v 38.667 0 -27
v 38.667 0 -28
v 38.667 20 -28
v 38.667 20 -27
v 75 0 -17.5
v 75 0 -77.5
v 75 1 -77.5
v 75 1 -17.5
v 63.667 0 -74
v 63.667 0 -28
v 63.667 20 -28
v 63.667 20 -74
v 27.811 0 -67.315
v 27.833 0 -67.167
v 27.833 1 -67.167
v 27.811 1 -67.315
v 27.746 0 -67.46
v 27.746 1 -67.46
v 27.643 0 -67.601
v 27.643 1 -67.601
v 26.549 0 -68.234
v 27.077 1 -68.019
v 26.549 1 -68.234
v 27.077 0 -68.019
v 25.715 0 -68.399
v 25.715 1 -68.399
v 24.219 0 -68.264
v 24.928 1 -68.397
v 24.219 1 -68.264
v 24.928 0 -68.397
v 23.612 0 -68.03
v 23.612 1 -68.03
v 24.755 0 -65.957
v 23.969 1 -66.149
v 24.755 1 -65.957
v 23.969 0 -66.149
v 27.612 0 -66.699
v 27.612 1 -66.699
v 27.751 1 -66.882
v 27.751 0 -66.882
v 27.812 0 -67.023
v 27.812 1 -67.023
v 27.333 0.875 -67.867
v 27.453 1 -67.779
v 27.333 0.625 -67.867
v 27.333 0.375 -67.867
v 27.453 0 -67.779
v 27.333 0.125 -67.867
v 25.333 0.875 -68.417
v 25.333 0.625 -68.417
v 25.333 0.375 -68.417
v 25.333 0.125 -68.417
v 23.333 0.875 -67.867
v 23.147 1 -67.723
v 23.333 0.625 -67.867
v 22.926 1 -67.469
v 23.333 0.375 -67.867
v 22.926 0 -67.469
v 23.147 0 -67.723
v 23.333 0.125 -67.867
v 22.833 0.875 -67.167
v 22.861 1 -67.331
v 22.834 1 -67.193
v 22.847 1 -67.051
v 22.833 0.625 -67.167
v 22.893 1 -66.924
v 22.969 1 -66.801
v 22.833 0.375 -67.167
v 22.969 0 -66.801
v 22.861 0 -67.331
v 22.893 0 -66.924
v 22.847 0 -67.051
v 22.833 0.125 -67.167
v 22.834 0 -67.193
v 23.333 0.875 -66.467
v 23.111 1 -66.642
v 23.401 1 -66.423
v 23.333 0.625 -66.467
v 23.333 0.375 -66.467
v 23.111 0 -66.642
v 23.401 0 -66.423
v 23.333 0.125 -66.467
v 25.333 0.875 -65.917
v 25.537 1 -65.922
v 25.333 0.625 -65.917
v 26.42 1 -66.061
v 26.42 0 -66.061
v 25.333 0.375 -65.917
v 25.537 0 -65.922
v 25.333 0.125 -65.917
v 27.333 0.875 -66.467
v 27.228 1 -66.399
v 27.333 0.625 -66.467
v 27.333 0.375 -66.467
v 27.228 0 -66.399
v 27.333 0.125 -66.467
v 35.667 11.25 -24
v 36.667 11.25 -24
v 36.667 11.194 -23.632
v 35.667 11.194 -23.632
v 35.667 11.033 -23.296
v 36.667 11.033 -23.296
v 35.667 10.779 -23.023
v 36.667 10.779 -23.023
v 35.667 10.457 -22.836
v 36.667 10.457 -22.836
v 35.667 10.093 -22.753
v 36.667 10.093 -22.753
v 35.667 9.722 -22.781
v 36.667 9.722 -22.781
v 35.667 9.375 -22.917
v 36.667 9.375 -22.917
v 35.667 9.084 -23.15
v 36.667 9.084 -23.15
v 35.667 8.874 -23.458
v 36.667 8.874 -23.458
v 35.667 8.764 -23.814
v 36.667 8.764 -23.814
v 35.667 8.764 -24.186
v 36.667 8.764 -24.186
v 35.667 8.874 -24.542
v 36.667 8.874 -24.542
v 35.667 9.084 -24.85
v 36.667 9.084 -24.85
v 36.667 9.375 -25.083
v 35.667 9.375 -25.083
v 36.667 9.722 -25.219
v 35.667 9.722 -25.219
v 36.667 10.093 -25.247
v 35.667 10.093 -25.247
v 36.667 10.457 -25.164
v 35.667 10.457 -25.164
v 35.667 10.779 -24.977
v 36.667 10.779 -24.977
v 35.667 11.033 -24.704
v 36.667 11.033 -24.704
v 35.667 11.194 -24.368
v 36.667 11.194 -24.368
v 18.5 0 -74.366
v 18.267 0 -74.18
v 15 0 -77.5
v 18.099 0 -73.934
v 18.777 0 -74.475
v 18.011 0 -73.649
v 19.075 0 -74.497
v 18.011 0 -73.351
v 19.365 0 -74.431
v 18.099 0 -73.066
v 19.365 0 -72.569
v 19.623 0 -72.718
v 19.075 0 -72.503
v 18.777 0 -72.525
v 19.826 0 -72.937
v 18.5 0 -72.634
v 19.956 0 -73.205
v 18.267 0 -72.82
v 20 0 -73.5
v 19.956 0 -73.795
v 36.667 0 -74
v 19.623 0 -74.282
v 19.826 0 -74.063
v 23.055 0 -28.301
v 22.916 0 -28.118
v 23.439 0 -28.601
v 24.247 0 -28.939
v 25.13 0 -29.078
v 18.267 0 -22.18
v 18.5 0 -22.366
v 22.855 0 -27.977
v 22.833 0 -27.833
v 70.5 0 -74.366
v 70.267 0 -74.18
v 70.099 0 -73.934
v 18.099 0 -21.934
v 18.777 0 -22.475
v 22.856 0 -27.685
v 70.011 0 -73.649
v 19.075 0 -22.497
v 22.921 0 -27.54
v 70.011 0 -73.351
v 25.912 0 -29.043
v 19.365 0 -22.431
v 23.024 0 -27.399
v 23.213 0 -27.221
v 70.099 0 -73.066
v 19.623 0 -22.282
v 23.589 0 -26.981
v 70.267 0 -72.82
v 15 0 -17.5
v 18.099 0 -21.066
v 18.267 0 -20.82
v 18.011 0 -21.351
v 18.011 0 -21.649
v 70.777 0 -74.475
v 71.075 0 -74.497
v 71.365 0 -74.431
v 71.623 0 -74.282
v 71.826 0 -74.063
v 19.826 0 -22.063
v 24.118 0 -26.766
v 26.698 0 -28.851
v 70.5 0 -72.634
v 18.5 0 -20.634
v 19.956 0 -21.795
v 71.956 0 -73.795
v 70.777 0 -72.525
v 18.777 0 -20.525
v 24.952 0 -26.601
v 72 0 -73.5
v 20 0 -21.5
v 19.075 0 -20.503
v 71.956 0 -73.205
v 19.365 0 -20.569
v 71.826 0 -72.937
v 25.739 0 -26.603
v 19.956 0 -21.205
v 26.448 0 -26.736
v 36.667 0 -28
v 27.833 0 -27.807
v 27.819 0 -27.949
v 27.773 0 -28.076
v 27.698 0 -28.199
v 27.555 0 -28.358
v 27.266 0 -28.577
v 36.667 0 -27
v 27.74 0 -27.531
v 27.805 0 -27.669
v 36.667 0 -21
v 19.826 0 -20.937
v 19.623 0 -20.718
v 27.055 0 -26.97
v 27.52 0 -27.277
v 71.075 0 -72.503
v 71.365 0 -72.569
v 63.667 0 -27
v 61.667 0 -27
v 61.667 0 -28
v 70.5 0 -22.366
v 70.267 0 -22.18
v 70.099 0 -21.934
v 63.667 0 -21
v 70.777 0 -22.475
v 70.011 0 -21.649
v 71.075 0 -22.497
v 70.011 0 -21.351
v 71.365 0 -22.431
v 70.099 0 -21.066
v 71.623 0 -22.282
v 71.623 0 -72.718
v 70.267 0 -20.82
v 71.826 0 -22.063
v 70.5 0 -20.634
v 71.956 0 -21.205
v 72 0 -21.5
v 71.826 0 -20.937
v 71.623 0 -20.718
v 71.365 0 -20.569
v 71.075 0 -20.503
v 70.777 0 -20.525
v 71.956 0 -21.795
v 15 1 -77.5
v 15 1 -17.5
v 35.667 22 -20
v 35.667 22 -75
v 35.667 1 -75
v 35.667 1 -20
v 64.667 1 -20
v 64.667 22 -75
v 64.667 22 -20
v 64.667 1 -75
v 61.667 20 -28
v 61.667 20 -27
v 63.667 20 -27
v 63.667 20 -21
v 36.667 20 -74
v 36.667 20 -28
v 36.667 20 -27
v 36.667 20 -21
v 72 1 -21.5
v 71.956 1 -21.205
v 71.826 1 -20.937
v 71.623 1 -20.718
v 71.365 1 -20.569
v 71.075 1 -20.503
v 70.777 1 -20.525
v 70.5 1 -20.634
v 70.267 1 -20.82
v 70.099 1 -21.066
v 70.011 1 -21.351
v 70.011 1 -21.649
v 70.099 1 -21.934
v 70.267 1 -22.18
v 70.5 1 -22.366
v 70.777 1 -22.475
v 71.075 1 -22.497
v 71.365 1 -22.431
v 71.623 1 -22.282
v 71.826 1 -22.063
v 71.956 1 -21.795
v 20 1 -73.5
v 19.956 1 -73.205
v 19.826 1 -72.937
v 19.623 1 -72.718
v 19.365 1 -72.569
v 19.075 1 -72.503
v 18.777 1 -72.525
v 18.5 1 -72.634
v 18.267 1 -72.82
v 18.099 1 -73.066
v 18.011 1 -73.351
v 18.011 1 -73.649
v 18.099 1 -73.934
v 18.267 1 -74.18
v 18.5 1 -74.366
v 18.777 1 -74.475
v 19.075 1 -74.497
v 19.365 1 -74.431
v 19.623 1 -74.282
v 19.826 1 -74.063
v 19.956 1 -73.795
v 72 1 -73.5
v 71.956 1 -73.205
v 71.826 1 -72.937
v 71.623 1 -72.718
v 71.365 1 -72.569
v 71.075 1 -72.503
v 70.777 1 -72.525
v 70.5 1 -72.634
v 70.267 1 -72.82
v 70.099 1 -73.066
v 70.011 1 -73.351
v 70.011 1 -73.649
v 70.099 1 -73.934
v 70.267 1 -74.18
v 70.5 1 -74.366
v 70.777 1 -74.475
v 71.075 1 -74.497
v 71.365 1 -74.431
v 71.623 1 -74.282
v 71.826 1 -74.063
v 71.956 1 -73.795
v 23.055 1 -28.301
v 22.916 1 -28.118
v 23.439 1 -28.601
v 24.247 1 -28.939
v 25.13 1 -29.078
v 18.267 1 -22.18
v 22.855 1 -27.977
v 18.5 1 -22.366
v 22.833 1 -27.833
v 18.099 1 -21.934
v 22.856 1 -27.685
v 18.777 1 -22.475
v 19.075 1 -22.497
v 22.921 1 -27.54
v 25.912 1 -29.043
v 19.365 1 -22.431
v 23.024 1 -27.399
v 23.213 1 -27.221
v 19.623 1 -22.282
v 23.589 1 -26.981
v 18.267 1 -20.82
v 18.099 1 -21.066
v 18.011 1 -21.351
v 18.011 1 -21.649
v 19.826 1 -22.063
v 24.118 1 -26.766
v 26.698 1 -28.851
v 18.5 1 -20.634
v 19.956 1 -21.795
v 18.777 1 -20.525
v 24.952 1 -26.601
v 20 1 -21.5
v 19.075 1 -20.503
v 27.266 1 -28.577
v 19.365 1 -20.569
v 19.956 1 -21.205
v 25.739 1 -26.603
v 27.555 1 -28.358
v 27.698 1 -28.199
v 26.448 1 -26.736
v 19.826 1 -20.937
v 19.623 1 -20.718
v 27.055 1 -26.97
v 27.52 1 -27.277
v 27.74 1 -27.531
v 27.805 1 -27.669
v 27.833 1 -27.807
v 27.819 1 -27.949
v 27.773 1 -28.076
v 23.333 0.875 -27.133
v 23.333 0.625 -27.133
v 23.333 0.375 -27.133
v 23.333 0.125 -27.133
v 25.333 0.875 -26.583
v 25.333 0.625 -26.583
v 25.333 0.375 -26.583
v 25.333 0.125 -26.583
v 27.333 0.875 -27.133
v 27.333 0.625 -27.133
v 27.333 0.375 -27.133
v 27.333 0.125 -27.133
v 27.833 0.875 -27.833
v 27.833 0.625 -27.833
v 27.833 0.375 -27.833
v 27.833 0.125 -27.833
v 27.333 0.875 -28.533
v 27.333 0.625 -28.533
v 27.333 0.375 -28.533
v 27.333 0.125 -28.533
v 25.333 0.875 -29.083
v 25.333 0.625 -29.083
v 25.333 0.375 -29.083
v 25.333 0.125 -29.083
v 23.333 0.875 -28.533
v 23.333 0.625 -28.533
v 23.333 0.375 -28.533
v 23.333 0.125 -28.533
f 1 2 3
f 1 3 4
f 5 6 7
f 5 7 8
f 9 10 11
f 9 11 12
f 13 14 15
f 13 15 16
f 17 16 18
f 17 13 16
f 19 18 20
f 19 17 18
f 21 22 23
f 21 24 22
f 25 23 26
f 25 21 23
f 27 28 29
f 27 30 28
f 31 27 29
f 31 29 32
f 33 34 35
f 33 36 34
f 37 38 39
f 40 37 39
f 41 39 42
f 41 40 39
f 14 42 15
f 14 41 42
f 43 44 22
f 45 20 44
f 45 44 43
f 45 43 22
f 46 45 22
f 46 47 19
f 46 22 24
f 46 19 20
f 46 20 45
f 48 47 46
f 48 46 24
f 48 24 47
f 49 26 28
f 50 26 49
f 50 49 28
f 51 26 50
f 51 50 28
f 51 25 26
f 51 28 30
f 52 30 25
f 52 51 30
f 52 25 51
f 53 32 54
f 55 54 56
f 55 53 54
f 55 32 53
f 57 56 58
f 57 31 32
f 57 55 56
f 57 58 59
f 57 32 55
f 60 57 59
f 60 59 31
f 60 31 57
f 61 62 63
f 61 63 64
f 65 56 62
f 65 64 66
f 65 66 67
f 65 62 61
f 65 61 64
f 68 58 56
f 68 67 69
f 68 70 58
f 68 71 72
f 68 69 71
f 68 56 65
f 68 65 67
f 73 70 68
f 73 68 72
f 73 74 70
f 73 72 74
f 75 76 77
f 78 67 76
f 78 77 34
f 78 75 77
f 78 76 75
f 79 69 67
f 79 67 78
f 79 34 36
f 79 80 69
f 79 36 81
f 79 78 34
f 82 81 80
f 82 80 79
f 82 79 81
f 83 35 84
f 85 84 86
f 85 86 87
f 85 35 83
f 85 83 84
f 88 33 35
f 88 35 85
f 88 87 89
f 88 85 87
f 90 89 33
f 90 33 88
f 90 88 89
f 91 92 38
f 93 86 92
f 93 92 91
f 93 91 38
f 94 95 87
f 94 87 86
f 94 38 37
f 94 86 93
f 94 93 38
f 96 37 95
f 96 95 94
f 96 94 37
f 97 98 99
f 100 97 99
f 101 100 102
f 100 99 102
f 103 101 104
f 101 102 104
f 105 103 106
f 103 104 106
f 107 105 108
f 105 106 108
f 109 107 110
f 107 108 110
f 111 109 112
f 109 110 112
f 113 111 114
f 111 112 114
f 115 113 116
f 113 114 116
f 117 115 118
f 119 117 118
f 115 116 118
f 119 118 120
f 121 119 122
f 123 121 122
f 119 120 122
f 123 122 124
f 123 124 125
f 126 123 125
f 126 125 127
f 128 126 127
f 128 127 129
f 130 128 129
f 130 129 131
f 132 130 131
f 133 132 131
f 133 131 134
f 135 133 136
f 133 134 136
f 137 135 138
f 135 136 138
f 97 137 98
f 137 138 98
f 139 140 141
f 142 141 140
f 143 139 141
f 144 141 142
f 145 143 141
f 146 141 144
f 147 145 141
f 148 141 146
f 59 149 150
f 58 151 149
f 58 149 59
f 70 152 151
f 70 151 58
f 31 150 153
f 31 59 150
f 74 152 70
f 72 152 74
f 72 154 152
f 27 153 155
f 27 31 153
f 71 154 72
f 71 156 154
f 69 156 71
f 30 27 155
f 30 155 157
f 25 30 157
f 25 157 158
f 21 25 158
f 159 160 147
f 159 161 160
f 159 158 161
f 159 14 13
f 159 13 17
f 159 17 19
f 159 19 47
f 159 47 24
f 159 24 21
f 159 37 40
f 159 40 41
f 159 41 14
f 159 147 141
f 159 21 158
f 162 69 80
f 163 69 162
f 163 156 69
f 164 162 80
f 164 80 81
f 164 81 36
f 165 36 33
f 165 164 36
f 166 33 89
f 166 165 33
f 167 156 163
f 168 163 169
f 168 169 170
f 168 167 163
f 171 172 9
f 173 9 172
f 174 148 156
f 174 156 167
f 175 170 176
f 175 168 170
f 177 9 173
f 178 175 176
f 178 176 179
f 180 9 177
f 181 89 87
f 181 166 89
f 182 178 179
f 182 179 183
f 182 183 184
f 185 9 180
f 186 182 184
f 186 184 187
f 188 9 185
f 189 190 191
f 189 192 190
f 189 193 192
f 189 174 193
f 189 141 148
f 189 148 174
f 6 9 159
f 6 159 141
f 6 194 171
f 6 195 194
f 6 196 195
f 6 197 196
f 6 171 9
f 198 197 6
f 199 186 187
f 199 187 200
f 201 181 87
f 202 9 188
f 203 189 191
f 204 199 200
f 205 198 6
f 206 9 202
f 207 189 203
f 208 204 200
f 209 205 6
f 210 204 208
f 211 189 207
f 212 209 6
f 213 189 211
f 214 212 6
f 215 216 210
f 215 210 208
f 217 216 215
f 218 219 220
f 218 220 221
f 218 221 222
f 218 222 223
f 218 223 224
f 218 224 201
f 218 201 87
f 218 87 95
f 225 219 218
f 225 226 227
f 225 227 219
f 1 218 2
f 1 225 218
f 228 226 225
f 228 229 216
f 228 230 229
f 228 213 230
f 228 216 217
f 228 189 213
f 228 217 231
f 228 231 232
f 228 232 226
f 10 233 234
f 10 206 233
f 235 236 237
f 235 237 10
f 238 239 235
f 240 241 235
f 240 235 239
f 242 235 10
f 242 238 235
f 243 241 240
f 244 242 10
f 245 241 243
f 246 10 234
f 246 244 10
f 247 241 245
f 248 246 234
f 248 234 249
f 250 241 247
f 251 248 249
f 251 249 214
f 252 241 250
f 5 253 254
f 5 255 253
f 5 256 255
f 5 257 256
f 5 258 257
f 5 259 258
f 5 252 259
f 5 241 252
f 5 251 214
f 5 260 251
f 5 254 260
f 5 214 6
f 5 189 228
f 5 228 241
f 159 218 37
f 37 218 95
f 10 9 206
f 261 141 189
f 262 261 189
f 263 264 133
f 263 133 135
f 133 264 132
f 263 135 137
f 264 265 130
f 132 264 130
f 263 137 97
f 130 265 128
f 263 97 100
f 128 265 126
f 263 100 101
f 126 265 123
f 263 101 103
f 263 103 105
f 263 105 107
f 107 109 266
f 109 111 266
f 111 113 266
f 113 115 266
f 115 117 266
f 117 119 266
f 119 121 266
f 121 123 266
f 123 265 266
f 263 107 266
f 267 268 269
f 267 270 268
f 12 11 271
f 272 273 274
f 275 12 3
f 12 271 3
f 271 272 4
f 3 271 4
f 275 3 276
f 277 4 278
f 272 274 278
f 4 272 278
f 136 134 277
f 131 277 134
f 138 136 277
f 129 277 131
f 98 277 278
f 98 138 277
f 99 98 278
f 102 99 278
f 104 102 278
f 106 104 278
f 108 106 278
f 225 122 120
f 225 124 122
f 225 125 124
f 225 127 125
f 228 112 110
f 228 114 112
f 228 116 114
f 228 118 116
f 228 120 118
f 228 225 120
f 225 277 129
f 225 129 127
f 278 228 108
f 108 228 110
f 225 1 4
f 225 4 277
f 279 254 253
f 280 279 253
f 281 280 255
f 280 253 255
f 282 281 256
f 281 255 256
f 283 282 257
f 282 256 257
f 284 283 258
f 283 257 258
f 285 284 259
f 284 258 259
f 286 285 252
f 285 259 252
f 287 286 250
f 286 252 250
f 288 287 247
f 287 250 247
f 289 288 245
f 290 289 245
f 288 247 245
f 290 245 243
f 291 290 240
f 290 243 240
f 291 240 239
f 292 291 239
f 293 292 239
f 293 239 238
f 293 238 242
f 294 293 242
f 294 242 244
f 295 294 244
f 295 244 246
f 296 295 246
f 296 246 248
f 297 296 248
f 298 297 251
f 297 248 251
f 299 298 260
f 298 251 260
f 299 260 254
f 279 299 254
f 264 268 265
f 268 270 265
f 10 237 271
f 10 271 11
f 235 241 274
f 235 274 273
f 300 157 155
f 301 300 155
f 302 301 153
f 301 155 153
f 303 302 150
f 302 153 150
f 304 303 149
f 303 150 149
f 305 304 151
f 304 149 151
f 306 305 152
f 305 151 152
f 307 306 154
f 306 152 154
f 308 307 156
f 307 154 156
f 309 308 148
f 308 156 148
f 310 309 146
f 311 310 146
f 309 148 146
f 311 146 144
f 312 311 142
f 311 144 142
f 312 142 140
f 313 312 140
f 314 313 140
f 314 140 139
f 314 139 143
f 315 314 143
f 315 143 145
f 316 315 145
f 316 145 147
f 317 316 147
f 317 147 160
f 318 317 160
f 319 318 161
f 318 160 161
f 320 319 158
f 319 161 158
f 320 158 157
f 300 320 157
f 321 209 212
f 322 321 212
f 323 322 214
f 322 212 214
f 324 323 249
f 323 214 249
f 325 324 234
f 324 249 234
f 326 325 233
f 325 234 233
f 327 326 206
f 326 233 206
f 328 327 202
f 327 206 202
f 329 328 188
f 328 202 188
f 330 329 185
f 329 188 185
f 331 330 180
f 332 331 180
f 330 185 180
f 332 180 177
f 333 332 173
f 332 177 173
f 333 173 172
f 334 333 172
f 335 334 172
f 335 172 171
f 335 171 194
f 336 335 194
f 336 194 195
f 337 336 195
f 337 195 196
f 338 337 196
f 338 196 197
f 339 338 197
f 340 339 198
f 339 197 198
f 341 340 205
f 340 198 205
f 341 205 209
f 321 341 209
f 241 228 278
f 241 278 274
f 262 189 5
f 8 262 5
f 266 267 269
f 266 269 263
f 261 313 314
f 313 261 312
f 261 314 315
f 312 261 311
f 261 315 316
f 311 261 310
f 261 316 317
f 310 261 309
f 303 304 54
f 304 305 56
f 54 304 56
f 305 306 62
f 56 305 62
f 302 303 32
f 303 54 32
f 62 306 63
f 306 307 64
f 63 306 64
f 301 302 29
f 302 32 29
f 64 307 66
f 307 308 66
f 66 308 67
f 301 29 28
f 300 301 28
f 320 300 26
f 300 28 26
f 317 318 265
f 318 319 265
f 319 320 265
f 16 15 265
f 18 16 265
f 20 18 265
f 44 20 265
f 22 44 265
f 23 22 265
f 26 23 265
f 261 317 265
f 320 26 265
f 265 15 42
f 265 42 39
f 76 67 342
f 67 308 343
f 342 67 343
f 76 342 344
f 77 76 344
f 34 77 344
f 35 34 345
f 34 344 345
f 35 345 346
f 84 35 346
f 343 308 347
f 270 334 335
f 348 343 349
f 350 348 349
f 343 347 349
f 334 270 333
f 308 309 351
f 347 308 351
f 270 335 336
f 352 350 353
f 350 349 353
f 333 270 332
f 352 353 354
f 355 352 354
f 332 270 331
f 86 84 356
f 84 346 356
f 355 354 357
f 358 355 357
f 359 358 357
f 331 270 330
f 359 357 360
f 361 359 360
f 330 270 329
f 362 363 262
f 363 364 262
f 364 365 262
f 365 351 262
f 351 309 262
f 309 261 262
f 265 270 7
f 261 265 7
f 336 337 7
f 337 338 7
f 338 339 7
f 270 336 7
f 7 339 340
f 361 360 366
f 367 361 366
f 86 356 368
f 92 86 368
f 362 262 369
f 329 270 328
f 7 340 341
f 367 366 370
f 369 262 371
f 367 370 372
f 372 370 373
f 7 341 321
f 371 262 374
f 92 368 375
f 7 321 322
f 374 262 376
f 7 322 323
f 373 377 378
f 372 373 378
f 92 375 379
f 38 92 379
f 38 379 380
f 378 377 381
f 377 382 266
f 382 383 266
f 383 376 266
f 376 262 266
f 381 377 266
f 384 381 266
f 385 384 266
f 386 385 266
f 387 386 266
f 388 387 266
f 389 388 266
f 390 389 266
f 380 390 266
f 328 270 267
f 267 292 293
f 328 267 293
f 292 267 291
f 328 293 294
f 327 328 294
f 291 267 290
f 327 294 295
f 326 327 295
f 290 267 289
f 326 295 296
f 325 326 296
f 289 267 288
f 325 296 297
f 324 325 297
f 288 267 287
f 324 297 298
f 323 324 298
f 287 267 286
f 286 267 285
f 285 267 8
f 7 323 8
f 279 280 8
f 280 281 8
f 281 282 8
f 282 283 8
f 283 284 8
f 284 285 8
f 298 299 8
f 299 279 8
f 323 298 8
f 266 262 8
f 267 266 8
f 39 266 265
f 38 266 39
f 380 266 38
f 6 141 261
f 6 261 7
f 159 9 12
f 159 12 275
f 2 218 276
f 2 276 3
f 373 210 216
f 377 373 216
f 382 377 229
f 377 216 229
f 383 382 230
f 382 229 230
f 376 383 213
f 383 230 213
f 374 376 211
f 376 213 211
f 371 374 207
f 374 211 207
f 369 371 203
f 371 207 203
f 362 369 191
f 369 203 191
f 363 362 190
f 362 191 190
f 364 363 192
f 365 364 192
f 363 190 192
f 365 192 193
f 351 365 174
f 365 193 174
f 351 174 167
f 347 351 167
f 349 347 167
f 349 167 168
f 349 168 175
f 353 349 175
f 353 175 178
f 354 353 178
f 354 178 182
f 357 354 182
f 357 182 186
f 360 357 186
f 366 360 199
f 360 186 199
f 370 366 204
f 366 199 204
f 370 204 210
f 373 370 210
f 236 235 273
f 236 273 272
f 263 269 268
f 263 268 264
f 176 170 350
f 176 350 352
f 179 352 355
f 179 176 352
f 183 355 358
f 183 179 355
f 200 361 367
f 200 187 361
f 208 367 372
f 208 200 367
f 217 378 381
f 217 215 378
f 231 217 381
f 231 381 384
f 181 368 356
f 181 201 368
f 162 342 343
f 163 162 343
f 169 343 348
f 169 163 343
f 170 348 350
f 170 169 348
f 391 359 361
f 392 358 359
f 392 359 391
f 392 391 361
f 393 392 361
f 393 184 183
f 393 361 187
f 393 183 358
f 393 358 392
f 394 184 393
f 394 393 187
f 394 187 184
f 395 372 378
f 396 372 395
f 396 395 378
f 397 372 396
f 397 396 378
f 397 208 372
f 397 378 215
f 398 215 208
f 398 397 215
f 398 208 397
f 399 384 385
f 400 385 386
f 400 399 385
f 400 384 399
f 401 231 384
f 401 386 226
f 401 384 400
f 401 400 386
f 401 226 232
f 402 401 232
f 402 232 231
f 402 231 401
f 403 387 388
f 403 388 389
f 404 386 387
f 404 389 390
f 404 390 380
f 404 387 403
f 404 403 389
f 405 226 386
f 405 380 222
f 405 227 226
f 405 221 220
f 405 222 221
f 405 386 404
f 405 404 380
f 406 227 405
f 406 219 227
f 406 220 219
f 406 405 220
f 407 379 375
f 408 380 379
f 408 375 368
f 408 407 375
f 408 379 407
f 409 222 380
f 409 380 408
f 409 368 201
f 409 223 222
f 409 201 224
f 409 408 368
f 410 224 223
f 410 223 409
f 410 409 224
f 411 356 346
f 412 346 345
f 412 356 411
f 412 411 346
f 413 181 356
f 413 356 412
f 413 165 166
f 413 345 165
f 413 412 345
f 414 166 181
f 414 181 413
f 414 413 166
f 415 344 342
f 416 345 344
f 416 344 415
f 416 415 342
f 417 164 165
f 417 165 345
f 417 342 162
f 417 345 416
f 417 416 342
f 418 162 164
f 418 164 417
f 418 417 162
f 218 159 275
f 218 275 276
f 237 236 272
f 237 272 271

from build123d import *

# Parameters (mm, degrees)
F0_W     = 60
F0_H     = 60
F0_R     = 1
F0_W_2   = 29
F0_H_2   = 55
F1_DEPTH = 1
F2_DEPTH = 20
F3_W     = 29
F3_H     = 55
F4_DEPTH = 2
F5_R     = 1.25
F6_DEPTH = 1


with BuildPart() as f1:
    # F0 (on Front) → F1 (new body)
    with BuildSketch(Plane.XZ):
        with Locations((45, -47.5)):
            Rectangle(F0_W, F0_H)
        with Locations((19, -73.5)):
            Circle(F0_R, mode=Mode.SUBTRACT)
        with BuildLine():
            add(Edge.make_bspline(
                [(28.3333333333, -67.1666666667), (28.3386910441, -67.1122126941), (28.3379488497, -66.9506494032), (28.2562853666, -66.6493198021), (28.002751809, -66.341706647), (27.672972526, -66.0654054786), (27.2898969931, -65.8388871979), (26.8077967498, -65.6378105429), (26.2767972884, -65.4717289024), (25.7573018765, -65.4109314105), (25.4558981893, -65.4106282423), (25.3333333333, -65.4166666667)],
                knots=[0, 0, 0, 0, 0.1634113073, 0.4836883399, 0.9124679887, 1.3341141703, 1.7731849289, 2.2406235312, 2.899707559, 3.4345550853, 3.8026975859, 3.8026975859, 3.8026975859, 3.8026975859], degree=3))
            add(Edge.make_bspline(
                [(28.3333333333, -67.1666666667), (28.3386910441, -67.2211206392), (28.3379488497, -67.3826839302), (28.2562853666, -67.6840135313), (28.002751809, -67.9916266863), (27.672972526, -68.2679278548), (27.2898969931, -68.4944461355), (26.8077967498, -68.6955227904), (26.2767972884, -68.861604431), (25.7573018765, -68.9224019229), (25.4558981893, -68.922705091), (25.3333333333, -68.9166666667)],
                knots=[0, 0, 0, 0, 0.1634113073, 0.4836883399, 0.9124679887, 1.3341141703, 1.7731849289, 2.2406235312, 2.899707559, 3.4345550853, 3.8026975859, 3.8026975859, 3.8026975859, 3.8026975859], degree=3))
            add(Edge.make_bspline(
                [(22.3333333333, -67.1666666667), (22.3279756226, -67.2211206392), (22.328717817, -67.3826839302), (22.4103813, -67.6840135313), (22.6639148576, -67.9916266863), (22.9936941407, -68.2679278548), (23.3767696736, -68.4944461355), (23.8588699169, -68.6955227904), (24.3898693782, -68.861604431), (24.9093647902, -68.9224019229), (25.2107684774, -68.922705091), (25.3333333333, -68.9166666667)],
                knots=[0, 0, 0, 0, 0.1634113073, 0.4836883399, 0.9124679887, 1.3341141703, 1.7731849289, 2.2406235312, 2.899707559, 3.4345550853, 3.8026975859, 3.8026975859, 3.8026975859, 3.8026975859], degree=3))
            add(Edge.make_bspline(
                [(22.3333333333, -67.1666666667), (22.3279756226, -67.1122126941), (22.328717817, -66.9506494032), (22.4103813, -66.6493198021), (22.6639148576, -66.341706647), (22.9936941407, -66.0654054786), (23.3767696736, -65.8388871979), (23.8588699169, -65.6378105429), (24.3898693782, -65.4717289024), (24.9093647902, -65.4109314105), (25.2107684774, -65.4106282423), (25.3333333333, -65.4166666667)],
                knots=[0, 0, 0, 0, 0.1634113073, 0.4836883399, 0.9124679887, 1.3341141703, 1.7731849289, 2.2406235312, 2.899707559, 3.4345550853, 3.8026975859, 3.8026975859, 3.8026975859, 3.8026975859], degree=3))
        make_face(mode=Mode.SUBTRACT)
        with Locations((71, -73.5)):
            Circle(F0_R, mode=Mode.SUBTRACT)
        with Locations((50.1666666667, -47.5)):
            Rectangle(F0_W_2, F0_H_2, mode=Mode.SUBTRACT)
        with BuildLine():
            add(Edge.make_bspline(
                [(28.3333333333, -27.8333333333), (28.3386910441, -27.7788793608), (28.3379488497, -27.6173160698), (28.2562853666, -27.3159864687), (28.002751809, -27.0083733137), (27.672972526, -26.7320721453), (27.2898969931, -26.5055538646), (26.8077967498, -26.3044772096), (26.2767972884, -26.138395569), (25.7573018765, -26.0775980772), (25.4558981893, -26.077294909), (25.3333333333, -26.0833333333)],
                knots=[0, 0, 0, 0, 0.1634113073, 0.4836883399, 0.9124679887, 1.3341141703, 1.7731849289, 2.2406235312, 2.899707559, 3.4345550853, 3.8026975859, 3.8026975859, 3.8026975859, 3.8026975859], degree=3))
            add(Edge.make_bspline(
                [(28.3333333333, -27.8333333333), (28.3386910441, -27.8877873059), (28.3379488497, -28.0493505969), (28.2562853666, -28.350680198), (28.002751809, -28.658293353), (27.672972526, -28.9345945214), (27.2898969931, -29.1611128021), (26.8077967498, -29.3621894571), (26.2767972884, -29.5282710976), (25.7573018765, -29.5890685895), (25.4558981893, -29.5893717577), (25.3333333333, -29.5833333333)],
                knots=[0, 0, 0, 0, 0.1634113073, 0.4836883399, 0.9124679887, 1.3341141703, 1.7731849289, 2.2406235312, 2.899707559, 3.4345550853, 3.8026975859, 3.8026975859, 3.8026975859, 3.8026975859], degree=3))
            add(Edge.make_bspline(
                [(22.3333333333, -27.8333333333), (22.3279756226, -27.8877873059), (22.328717817, -28.0493505969), (22.4103813, -28.350680198), (22.6639148576, -28.658293353), (22.9936941407, -28.9345945214), (23.3767696736, -29.1611128021), (23.8588699169, -29.3621894571), (24.3898693782, -29.5282710976), (24.9093647902, -29.5890685895), (25.2107684774, -29.5893717577), (25.3333333333, -29.5833333333)],
                knots=[0, 0, 0, 0, 0.1634113073, 0.4836883399, 0.9124679887, 1.3341141703, 1.7731849289, 2.2406235312, 2.899707559, 3.4345550853, 3.8026975859, 3.8026975859, 3.8026975859, 3.8026975859], degree=3))
            add(Edge.make_bspline(
                [(22.3333333333, -27.8333333333), (22.3279756226, -27.7788793608), (22.328717817, -27.6173160698), (22.4103813, -27.3159864687), (22.6639148576, -27.0083733137), (22.9936941407, -26.7320721453), (23.3767696736, -26.5055538646), (23.8588699169, -26.3044772096), (24.3898693782, -26.138395569), (24.9093647902, -26.0775980772), (25.2107684774, -26.077294909), (25.3333333333, -26.0833333333)],
                knots=[0, 0, 0, 0, 0.1634113073, 0.4836883399, 0.9124679887, 1.3341141703, 1.7731849289, 2.2406235312, 2.899707559, 3.4345550853, 3.8026975859, 3.8026975859, 3.8026975859, 3.8026975859], degree=3))
        make_face(mode=Mode.SUBTRACT)
        with Locations((19, -21.5)):
            Circle(F0_R, mode=Mode.SUBTRACT)
        with Locations((71, -21.5)):
            Circle(F0_R, mode=Mode.SUBTRACT)
        with BuildLine():
            add(Edge.make_bspline(
                [(28.3333333333, -67.1666666667), (28.3386910441, -67.2211206392), (28.3379488497, -67.3826839302), (28.2562853666, -67.6840135313), (28.002751809, -67.9916266863), (27.672972526, -68.2679278548), (27.2898969931, -68.4944461355), (26.8077967498, -68.6955227904), (26.2767972884, -68.861604431), (25.7573018765, -68.9224019229), (25.4558981893, -68.922705091), (25.3333333333, -68.9166666667)],
                knots=[0, 0, 0, 0, 0.1634113073, 0.4836883399, 0.9124679887, 1.3341141703, 1.7731849289, 2.2406235312, 2.899707559, 3.4345550853, 3.8026975859, 3.8026975859, 3.8026975859, 3.8026975859], degree=3))
            add(Edge.make_bspline(
                [(28.3333333333, -67.1666666667), (28.3386910441, -67.1122126941), (28.3379488497, -66.9506494032), (28.2562853666, -66.6493198021), (28.002751809, -66.341706647), (27.672972526, -66.0654054786), (27.2898969931, -65.8388871979), (26.8077967498, -65.6378105429), (26.2767972884, -65.4717289024), (25.7573018765, -65.4109314105), (25.4558981893, -65.4106282423), (25.3333333333, -65.4166666667)],
                knots=[0, 0, 0, 0, 0.1634113073, 0.4836883399, 0.9124679887, 1.3341141703, 1.7731849289, 2.2406235312, 2.899707559, 3.4345550853, 3.8026975859, 3.8026975859, 3.8026975859, 3.8026975859], degree=3))
            add(Edge.make_bspline(
                [(22.3333333333, -67.1666666667), (22.3279756226, -67.1122126941), (22.328717817, -66.9506494032), (22.4103813, -66.6493198021), (22.6639148576, -66.341706647), (22.9936941407, -66.0654054786), (23.3767696736, -65.8388871979), (23.8588699169, -65.6378105429), (24.3898693782, -65.4717289024), (24.9093647902, -65.4109314105), (25.2107684774, -65.4106282423), (25.3333333333, -65.4166666667)],
                knots=[0, 0, 0, 0, 0.1634113073, 0.4836883399, 0.9124679887, 1.3341141703, 1.7731849289, 2.2406235312, 2.899707559, 3.4345550853, 3.8026975859, 3.8026975859, 3.8026975859, 3.8026975859], degree=3))
            add(Edge.make_bspline(
                [(22.3333333333, -67.1666666667), (22.3279756226, -67.2211206392), (22.328717817, -67.3826839302), (22.4103813, -67.6840135313), (22.6639148576, -67.9916266863), (22.9936941407, -68.2679278548), (23.3767696736, -68.4944461355), (23.8588699169, -68.6955227904), (24.3898693782, -68.861604431), (24.9093647902, -68.9224019229), (25.2107684774, -68.922705091), (25.3333333333, -68.9166666667)],
                knots=[0, 0, 0, 0, 0.1634113073, 0.4836883399, 0.9124679887, 1.3341141703, 1.7731849289, 2.2406235312, 2.899707559, 3.4345550853, 3.8026975859, 3.8026975859, 3.8026975859, 3.8026975859], degree=3))
        make_face()
        with BuildLine():
            add(Edge.make_bspline(
                [(27.8333333333, -67.1666666667), (27.8333333333, -66.9166666667), (27.3315200266, -66.294377896), (26.1333333333, -65.9166666667), (25.3333333333, -65.9166666667)],
                knots=[0, 0, 0, 0, 0.3917230185, 1, 1, 1, 1], degree=3))
            add(Edge.make_bspline(
                [(27.8333333333, -67.1666666667), (27.8333333333, -67.4166666667), (27.3315200266, -68.0389554373), (26.1333333333, -68.4166666667), (25.3333333333, -68.4166666667)],
                knots=[0, 0, 0, 0, 0.3917230185, 1, 1, 1, 1], degree=3))
            add(Edge.make_bspline(
                [(22.8333333333, -67.1666666667), (22.8333333333, -67.4166666667), (23.3351466401, -68.0389554373), (24.5333333333, -68.4166666667), (25.3333333333, -68.4166666667)],
                knots=[0, 0, 0, 0, 0.3917230185, 1, 1, 1, 1], degree=3))
            add(Edge.make_bspline(
                [(22.8333333333, -67.1666666667), (22.8333333333, -66.9166666667), (23.3351466401, -66.294377896), (24.5333333333, -65.9166666667), (25.3333333333, -65.9166666667)],
                knots=[0, 0, 0, 0, 0.3917230185, 1, 1, 1, 1], degree=3))
        make_face(mode=Mode.SUBTRACT)
        with BuildLine():
            add(Edge.make_bspline(
                [(28.3333333333, -27.8333333333), (28.3386910441, -27.8877873059), (28.3379488497, -28.0493505969), (28.2562853666, -28.350680198), (28.002751809, -28.658293353), (27.672972526, -28.9345945214), (27.2898969931, -29.1611128021), (26.8077967498, -29.3621894571), (26.2767972884, -29.5282710976), (25.7573018765, -29.5890685895), (25.4558981893, -29.5893717577), (25.3333333333, -29.5833333333)],
                knots=[0, 0, 0, 0, 0.1634113073, 0.4836883399, 0.9124679887, 1.3341141703, 1.7731849289, 2.2406235312, 2.899707559, 3.4345550853, 3.8026975859, 3.8026975859, 3.8026975859, 3.8026975859], degree=3))
            add(Edge.make_bspline(
                [(28.3333333333, -27.8333333333), (28.3386910441, -27.7788793608), (28.3379488497, -27.6173160698), (28.2562853666, -27.3159864687), (28.002751809, -27.0083733137), (27.672972526, -26.7320721453), (27.2898969931, -26.5055538646), (26.8077967498, -26.3044772096), (26.2767972884, -26.138395569), (25.7573018765, -26.0775980772), (25.4558981893, -26.077294909), (25.3333333333, -26.0833333333)],
                knots=[0, 0, 0, 0, 0.1634113073, 0.4836883399, 0.9124679887, 1.3341141703, 1.7731849289, 2.2406235312, 2.899707559, 3.4345550853, 3.8026975859, 3.8026975859, 3.8026975859, 3.8026975859], degree=3))
            add(Edge.make_bspline(
                [(22.3333333333, -27.8333333333), (22.3279756226, -27.7788793608), (22.328717817, -27.6173160698), (22.4103813, -27.3159864687), (22.6639148576, -27.0083733137), (22.9936941407, -26.7320721453), (23.3767696736, -26.5055538646), (23.8588699169, -26.3044772096), (24.3898693782, -26.138395569), (24.9093647902, -26.0775980772), (25.2107684774, -26.077294909), (25.3333333333, -26.0833333333)],
                knots=[0, 0, 0, 0, 0.1634113073, 0.4836883399, 0.9124679887, 1.3341141703, 1.7731849289, 2.2406235312, 2.899707559, 3.4345550853, 3.8026975859, 3.8026975859, 3.8026975859, 3.8026975859], degree=3))
            add(Edge.make_bspline(
                [(22.3333333333, -27.8333333333), (22.3279756226, -27.8877873059), (22.328717817, -28.0493505969), (22.4103813, -28.350680198), (22.6639148576, -28.658293353), (22.9936941407, -28.9345945214), (23.3767696736, -29.1611128021), (23.8588699169, -29.3621894571), (24.3898693782, -29.5282710976), (24.9093647902, -29.5890685895), (25.2107684774, -29.5893717577), (25.3333333333, -29.5833333333)],
                knots=[0, 0, 0, 0, 0.1634113073, 0.4836883399, 0.9124679887, 1.3341141703, 1.7731849289, 2.2406235312, 2.899707559, 3.4345550853, 3.8026975859, 3.8026975859, 3.8026975859, 3.8026975859], degree=3))
        make_face()
        with BuildLine():
            add(Edge.make_bspline(
                [(22.8333333333, -27.8333333333), (22.8333333333, -28.0833333333), (23.3351466401, -28.705622104), (24.5333333333, -29.0833333333), (25.3333333333, -29.0833333333)],
                knots=[0, 0, 0, 0, 0.3917230185, 1, 1, 1, 1], degree=3))
            add(Edge.make_bspline(
                [(22.8333333333, -27.8333333333), (22.8333333333, -27.5833333333), (23.3351466401, -26.9610445627), (24.5333333333, -26.5833333333), (25.3333333333, -26.5833333333)],
                knots=[0, 0, 0, 0, 0.3917230185, 1, 1, 1, 1], degree=3))
            add(Edge.make_bspline(
                [(27.8333333333, -27.8333333333), (27.8333333333, -27.5833333333), (27.3315200266, -26.9610445627), (26.1333333333, -26.5833333333), (25.3333333333, -26.5833333333)],
                knots=[0, 0, 0, 0, 0.3917230185, 1, 1, 1, 1], degree=3))
            add(Edge.make_bspline(
                [(27.8333333333, -27.8333333333), (27.8333333333, -28.0833333333), (27.3315200266, -28.705622104), (26.1333333333, -29.0833333333), (25.3333333333, -29.0833333333)],
                knots=[0, 0, 0, 0, 0.3917230185, 1, 1, 1, 1], degree=3))
        make_face(mode=Mode.SUBTRACT)
        with Locations((50.1666666667, -47.5)):
            Rectangle(F0_W_2, F0_H_2)
        Polygon((36.6666666667, -74), (36.6666666667, -28), (38.6666666667, -28), (38.6666666667, -27), (36.6666666667, -27), (36.6666666667, -21), (63.6666666667, -21), (63.6666666667, -27), (61.6666666667, -27), (61.6666666667, -28), (63.6666666667, -28), (63.6666666667, -74), align=None, mode=Mode.SUBTRACT)
    extrude(amount=-F1_DEPTH)

    # F0 (on Front) → F2 (join)
    with BuildSketch(Plane.XZ):
        with Locations((50.1666666667, -47.5)):
            Rectangle(F0_W_2, F0_H_2)
        Polygon((36.6666666667, -74), (36.6666666667, -28), (38.6666666667, -28), (38.6666666667, -27), (36.6666666667, -27), (36.6666666667, -21), (63.6666666667, -21), (63.6666666667, -27), (61.6666666667, -27), (61.6666666667, -28), (63.6666666667, -28), (63.6666666667, -74), align=None, mode=Mode.SUBTRACT)
    extrude(amount=-F2_DEPTH)

    # F3 (on face) → F4 (join)
    with BuildSketch(Plane(origin=(0, 20, 0), x_dir=(-1, 0, 0), z_dir=(0, 1, 0))):
        with Locations((-50.1666666667, -47.5)):
            Rectangle(F3_W, F3_H)
    extrude(amount=F4_DEPTH)

    # F5 (on face) → F6 (cut, through all)
    with BuildSketch(Plane.YZ.offset(36.6666666667)):
        with Locations((10, -24)):
            Circle(F5_R)
    extrude(amount=-F6_DEPTH, mode=Mode.SUBTRACT)


solid = f1.part
